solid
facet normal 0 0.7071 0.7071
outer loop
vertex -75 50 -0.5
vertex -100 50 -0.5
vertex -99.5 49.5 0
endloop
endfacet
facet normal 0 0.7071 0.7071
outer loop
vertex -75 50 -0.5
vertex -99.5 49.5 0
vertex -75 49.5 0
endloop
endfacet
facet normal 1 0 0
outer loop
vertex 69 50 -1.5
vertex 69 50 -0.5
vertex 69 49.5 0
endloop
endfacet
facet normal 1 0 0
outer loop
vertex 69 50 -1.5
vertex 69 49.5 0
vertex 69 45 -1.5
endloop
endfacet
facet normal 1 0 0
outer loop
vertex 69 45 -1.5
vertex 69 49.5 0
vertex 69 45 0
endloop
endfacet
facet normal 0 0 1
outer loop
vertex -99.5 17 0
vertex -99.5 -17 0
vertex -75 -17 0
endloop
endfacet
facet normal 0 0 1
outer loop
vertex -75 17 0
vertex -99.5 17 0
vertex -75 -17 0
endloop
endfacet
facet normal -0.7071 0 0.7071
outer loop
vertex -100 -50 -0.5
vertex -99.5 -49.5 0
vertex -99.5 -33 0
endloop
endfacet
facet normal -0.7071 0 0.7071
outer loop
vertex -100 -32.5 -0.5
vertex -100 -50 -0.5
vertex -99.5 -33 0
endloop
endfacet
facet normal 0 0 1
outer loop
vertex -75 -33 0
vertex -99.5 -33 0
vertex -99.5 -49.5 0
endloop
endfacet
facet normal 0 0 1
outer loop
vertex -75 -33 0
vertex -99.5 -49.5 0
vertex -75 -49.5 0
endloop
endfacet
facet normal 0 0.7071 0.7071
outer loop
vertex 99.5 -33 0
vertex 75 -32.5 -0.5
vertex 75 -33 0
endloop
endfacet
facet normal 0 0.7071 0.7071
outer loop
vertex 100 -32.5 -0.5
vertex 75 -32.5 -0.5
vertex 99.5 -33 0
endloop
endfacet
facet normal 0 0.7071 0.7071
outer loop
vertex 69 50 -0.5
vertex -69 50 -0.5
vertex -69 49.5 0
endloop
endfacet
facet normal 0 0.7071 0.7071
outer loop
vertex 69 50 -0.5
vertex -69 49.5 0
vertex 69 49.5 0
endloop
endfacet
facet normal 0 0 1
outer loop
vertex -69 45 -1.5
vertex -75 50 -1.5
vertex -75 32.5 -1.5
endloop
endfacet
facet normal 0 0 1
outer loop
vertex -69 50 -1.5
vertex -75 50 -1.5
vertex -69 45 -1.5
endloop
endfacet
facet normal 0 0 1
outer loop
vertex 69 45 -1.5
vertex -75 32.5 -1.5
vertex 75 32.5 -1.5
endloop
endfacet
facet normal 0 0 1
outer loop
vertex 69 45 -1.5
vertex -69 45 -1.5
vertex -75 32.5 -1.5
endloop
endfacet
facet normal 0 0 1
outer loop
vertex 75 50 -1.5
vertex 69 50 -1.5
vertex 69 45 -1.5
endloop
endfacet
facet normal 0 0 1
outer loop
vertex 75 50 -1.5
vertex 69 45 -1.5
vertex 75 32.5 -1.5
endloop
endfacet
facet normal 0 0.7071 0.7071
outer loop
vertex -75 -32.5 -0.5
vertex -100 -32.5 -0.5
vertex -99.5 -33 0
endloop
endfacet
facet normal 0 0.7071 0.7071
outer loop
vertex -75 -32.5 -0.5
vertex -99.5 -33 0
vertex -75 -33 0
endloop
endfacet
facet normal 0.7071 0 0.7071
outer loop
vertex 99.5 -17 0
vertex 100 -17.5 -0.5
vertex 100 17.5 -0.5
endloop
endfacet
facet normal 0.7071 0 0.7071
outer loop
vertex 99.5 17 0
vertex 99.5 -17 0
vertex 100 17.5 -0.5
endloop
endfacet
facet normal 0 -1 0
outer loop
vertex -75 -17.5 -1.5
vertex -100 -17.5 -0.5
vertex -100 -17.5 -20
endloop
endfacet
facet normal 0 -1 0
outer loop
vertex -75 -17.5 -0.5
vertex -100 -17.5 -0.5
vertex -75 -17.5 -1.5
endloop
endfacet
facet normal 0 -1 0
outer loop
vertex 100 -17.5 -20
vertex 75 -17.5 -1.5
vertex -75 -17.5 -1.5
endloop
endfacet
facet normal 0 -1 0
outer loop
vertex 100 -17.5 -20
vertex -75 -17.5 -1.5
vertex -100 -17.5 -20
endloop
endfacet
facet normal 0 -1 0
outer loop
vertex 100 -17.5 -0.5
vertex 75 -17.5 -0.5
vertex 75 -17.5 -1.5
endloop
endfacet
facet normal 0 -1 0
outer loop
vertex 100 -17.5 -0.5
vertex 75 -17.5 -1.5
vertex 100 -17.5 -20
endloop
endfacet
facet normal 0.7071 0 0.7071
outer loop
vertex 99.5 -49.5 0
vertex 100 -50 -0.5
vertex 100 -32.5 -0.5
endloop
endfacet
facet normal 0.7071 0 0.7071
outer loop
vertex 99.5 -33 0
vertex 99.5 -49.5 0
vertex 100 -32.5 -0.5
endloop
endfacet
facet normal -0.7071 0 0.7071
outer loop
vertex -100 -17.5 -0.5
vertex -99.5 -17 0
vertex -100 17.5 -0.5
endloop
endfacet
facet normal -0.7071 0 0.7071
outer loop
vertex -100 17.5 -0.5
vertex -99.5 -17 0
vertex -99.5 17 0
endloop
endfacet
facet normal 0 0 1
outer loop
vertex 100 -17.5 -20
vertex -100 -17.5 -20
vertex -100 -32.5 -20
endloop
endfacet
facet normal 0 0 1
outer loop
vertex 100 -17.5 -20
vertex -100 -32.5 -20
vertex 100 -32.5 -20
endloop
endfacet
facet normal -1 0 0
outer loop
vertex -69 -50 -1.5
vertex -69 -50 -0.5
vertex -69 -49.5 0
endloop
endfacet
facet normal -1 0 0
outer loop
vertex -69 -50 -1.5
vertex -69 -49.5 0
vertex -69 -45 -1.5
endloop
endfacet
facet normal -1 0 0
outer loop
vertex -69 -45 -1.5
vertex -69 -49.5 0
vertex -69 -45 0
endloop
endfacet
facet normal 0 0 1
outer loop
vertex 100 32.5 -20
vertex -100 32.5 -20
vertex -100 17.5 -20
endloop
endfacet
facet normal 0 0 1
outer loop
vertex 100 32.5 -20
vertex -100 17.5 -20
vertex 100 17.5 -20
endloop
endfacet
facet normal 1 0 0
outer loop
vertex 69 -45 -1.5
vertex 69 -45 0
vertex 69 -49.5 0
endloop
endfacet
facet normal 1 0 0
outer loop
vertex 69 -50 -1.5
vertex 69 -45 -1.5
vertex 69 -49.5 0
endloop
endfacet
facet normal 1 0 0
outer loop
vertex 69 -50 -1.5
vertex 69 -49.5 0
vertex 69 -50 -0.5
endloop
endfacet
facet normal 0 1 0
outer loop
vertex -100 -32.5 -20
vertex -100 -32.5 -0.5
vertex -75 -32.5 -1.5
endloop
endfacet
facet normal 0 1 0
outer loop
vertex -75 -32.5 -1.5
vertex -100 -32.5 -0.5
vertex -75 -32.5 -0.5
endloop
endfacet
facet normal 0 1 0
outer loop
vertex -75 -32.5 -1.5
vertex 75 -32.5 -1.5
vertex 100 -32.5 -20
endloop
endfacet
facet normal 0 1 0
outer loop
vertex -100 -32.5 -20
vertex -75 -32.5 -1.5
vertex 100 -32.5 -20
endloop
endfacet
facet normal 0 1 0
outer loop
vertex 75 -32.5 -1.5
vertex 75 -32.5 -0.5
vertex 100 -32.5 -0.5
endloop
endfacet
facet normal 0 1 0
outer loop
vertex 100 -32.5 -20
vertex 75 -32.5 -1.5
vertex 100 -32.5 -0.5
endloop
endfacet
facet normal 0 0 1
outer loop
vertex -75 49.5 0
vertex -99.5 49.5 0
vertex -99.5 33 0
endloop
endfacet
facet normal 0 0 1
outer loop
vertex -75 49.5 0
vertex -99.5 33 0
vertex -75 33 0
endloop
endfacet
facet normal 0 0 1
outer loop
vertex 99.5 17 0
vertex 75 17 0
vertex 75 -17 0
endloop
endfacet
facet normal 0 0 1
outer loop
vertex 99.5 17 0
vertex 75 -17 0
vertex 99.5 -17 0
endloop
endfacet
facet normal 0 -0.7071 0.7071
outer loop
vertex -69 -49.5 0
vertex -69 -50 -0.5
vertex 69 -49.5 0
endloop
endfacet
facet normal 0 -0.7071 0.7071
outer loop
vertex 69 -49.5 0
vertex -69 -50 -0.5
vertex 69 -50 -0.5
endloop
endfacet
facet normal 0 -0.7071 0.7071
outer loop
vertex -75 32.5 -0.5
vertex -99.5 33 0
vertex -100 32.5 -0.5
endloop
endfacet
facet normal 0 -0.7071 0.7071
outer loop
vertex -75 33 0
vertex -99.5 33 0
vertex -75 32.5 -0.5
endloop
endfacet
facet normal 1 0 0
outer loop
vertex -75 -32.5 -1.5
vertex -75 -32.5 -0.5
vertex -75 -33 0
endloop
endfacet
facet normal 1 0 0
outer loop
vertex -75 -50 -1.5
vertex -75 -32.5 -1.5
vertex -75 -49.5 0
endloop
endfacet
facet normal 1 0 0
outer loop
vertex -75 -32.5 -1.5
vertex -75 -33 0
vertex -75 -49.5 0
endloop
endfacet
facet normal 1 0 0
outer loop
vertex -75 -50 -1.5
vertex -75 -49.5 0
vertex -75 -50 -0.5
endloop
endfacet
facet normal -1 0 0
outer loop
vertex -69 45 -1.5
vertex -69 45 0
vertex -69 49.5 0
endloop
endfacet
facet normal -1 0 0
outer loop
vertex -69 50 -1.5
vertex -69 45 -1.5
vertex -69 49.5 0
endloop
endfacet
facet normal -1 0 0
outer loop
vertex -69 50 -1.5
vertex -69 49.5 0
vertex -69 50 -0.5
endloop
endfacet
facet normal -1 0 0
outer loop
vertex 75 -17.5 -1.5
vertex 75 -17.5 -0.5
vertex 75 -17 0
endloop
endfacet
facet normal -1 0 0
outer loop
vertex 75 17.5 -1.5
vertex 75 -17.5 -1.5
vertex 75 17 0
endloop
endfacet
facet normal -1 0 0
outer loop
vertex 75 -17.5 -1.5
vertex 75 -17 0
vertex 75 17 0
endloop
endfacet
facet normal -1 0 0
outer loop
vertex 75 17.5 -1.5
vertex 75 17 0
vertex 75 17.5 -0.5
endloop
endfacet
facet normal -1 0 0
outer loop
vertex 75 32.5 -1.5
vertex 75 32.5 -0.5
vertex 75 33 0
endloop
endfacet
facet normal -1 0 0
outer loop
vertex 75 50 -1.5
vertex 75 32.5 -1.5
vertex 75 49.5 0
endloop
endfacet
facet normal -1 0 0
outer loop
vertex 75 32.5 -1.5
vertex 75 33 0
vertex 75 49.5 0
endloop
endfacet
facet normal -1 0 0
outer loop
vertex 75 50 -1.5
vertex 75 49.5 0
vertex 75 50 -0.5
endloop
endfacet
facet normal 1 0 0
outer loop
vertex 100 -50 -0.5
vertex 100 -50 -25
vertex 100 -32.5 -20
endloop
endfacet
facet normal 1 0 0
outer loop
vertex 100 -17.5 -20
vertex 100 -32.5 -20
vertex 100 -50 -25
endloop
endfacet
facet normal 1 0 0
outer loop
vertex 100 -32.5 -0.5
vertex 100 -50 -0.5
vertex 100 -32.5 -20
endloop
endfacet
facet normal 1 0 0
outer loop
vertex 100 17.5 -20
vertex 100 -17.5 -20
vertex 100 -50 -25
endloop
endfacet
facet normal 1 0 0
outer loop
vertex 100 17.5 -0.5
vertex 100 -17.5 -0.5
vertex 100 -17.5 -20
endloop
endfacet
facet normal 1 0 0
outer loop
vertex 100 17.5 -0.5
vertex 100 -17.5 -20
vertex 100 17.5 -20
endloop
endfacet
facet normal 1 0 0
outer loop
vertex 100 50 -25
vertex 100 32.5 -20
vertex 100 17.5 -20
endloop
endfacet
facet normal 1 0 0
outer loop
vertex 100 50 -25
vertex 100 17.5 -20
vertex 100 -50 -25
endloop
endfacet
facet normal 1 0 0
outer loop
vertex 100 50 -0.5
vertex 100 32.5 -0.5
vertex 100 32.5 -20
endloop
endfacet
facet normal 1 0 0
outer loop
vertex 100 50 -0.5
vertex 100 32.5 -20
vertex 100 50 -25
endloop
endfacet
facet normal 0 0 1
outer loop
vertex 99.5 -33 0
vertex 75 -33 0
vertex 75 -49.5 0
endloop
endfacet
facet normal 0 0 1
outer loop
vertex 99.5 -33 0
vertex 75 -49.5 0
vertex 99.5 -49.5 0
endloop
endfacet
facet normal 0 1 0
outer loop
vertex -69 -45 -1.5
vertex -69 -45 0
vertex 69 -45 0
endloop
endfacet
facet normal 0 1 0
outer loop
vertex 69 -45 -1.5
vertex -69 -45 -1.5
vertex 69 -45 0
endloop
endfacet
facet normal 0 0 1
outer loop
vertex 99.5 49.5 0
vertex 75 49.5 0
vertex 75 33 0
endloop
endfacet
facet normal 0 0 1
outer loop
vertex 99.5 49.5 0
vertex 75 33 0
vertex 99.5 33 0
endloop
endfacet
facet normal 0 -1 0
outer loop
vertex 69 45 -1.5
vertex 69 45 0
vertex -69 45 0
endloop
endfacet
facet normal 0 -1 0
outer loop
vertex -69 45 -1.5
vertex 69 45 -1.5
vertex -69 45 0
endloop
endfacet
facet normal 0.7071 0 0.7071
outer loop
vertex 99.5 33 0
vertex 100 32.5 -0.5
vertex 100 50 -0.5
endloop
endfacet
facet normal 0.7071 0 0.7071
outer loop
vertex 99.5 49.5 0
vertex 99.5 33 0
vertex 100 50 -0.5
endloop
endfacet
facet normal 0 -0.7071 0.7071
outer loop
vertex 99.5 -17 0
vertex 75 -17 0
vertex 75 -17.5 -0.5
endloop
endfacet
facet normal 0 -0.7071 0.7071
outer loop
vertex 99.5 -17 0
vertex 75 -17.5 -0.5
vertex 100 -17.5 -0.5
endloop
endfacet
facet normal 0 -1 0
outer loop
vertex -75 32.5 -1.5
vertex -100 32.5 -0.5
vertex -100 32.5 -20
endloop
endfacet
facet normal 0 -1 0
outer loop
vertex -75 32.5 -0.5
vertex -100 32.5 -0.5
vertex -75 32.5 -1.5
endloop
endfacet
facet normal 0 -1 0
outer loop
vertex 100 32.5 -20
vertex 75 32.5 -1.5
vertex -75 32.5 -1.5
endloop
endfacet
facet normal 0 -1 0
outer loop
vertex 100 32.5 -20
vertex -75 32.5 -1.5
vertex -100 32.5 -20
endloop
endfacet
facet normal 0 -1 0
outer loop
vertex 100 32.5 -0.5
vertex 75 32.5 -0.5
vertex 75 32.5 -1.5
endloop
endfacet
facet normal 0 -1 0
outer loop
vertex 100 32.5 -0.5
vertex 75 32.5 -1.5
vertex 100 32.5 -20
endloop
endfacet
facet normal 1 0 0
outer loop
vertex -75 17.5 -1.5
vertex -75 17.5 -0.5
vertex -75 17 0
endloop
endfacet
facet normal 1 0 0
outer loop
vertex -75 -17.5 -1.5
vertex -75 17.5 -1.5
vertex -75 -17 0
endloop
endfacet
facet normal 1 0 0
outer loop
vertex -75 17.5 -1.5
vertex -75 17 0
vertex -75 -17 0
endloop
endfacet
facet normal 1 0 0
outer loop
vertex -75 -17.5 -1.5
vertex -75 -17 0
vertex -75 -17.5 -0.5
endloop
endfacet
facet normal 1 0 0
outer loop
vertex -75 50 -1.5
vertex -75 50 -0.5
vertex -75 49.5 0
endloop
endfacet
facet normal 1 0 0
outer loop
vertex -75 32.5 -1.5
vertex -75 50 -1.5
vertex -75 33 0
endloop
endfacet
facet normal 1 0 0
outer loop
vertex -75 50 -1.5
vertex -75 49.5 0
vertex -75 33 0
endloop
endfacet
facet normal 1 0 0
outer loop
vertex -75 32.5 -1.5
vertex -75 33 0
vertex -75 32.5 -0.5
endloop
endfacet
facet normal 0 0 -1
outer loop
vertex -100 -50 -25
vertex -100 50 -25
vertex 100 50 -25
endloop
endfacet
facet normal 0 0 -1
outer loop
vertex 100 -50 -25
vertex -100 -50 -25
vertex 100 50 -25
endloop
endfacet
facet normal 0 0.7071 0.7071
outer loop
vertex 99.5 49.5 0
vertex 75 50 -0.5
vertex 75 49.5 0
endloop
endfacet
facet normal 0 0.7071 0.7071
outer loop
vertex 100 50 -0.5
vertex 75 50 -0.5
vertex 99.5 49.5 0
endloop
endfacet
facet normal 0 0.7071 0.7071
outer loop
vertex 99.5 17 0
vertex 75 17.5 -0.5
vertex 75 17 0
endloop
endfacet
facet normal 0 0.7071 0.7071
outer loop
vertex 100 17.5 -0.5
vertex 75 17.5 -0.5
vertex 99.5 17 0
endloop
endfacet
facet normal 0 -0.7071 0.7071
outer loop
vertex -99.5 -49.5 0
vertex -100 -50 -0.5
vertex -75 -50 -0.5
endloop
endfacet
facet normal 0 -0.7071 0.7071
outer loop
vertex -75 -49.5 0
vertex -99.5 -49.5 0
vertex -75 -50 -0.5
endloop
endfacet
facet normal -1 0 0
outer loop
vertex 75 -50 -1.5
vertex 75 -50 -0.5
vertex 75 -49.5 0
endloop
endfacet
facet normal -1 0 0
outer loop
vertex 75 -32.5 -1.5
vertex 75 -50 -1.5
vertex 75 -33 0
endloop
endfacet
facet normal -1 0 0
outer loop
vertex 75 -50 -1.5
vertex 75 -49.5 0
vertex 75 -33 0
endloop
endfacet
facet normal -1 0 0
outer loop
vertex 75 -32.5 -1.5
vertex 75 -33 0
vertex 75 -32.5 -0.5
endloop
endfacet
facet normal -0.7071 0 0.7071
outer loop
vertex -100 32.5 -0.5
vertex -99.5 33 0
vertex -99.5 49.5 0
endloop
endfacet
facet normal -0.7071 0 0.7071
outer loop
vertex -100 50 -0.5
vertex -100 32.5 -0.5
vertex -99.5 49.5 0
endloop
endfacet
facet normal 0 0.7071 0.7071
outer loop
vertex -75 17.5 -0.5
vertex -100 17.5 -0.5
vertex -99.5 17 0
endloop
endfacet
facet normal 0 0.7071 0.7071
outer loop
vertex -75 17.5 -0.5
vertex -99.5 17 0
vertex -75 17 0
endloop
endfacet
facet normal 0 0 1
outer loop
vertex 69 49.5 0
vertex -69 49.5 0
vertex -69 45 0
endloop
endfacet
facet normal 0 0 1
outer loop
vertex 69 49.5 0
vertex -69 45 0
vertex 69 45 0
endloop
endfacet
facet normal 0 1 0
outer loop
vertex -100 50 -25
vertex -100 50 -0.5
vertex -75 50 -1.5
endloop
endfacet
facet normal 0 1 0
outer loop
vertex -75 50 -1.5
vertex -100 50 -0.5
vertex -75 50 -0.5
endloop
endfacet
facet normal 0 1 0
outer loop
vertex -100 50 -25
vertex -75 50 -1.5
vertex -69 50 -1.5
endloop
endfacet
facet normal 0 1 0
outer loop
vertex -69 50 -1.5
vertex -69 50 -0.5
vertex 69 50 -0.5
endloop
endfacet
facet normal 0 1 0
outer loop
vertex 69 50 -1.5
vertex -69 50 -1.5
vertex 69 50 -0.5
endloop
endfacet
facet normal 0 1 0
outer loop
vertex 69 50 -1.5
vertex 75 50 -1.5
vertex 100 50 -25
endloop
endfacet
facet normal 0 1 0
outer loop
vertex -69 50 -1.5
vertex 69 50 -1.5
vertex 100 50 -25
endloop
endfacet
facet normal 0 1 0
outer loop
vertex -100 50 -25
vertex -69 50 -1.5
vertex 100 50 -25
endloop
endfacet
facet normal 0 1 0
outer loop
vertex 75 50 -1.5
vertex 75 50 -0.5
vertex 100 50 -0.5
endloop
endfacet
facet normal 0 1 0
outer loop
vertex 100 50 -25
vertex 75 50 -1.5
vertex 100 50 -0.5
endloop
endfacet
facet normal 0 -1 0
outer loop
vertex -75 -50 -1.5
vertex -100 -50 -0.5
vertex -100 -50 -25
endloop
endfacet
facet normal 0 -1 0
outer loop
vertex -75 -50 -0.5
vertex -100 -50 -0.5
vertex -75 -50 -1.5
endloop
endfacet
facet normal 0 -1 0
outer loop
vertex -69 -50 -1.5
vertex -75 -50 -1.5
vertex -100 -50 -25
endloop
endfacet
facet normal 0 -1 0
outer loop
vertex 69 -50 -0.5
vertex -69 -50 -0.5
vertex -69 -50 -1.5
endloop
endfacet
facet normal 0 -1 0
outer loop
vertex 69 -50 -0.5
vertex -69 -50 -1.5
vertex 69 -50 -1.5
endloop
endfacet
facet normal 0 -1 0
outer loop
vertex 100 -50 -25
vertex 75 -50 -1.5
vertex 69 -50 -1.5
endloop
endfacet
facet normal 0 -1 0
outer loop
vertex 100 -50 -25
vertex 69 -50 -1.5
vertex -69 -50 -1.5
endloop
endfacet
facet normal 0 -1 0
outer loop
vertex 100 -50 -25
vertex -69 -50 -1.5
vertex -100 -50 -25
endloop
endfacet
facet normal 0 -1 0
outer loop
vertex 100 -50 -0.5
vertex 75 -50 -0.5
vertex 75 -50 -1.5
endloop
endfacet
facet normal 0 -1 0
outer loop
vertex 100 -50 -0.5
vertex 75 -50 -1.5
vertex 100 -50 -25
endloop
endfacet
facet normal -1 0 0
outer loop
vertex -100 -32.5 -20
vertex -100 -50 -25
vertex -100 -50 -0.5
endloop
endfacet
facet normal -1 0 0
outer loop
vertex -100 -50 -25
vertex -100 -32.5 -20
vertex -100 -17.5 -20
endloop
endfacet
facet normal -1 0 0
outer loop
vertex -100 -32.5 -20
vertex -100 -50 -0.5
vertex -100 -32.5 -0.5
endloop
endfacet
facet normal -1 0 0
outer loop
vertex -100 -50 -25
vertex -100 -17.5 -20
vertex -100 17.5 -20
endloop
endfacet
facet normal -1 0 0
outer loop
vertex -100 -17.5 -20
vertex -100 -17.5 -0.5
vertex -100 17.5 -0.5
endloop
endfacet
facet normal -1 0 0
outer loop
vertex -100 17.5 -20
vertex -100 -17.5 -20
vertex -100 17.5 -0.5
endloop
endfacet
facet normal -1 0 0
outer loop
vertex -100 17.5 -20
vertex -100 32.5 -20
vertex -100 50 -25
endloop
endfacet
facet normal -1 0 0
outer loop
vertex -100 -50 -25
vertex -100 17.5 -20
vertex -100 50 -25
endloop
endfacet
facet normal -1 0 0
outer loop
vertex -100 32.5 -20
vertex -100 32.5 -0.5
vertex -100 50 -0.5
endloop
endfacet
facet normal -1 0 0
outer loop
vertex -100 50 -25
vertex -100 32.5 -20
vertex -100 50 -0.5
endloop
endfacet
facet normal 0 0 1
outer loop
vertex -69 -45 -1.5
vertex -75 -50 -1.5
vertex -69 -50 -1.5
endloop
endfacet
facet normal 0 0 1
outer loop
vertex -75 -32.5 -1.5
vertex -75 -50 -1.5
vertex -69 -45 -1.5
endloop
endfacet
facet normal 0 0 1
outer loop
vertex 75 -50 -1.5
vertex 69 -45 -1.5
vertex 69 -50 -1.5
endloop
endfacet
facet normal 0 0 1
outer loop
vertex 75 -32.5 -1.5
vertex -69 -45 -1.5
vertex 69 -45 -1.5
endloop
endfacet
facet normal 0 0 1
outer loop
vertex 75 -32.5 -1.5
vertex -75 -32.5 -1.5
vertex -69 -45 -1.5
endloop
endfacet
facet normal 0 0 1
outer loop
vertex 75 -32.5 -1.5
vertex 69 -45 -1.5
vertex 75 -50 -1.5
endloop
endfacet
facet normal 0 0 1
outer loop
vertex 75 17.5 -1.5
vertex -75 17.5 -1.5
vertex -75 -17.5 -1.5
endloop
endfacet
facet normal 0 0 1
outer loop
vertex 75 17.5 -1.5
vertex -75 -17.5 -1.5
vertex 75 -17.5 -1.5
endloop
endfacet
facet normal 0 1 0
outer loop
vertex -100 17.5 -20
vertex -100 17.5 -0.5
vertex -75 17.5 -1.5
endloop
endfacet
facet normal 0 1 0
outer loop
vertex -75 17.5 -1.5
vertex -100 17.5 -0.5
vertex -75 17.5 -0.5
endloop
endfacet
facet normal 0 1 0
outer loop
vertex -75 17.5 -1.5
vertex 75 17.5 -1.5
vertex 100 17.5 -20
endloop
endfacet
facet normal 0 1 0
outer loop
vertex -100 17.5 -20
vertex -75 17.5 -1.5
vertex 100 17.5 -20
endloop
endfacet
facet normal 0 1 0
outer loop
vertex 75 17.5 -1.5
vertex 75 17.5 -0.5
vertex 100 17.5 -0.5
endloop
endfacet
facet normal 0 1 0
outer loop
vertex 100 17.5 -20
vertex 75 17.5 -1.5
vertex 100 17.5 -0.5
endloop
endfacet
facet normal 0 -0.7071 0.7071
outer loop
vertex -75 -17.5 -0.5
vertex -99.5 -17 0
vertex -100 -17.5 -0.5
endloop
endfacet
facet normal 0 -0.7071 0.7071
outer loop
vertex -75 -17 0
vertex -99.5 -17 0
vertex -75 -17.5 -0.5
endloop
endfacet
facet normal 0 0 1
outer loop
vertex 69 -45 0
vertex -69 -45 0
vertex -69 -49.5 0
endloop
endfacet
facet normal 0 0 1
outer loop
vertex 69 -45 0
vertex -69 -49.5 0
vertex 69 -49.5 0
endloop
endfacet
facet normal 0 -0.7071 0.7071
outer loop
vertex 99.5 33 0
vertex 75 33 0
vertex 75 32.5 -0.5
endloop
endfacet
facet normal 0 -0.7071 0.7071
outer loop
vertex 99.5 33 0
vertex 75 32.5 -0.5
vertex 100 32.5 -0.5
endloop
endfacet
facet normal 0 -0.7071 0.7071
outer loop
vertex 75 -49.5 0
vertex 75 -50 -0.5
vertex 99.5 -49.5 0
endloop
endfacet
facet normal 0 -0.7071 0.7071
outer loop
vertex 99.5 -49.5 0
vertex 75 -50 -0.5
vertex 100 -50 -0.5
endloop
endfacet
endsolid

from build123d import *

# Parameters (mm, degrees)
F0_W     = 200
F0_H     = 100
F1_DEPTH = 25
F2_W     = 200
F2_H     = 15
F3_DEPTH = 20
F4_SIZE  = 0.5
F6_DEPTH = 1.5


with BuildPart() as f1:
    # F0 (on Top) → F1 (new body)
    with BuildSketch(Plane.XY):
        Rectangle(F0_W, F0_H)
    extrude(amount=-F1_DEPTH)

    # F2 (on face) → F3 (cut)
    with BuildSketch(Plane.XY):
        with Locations((0, 25.0000003725)):
            Rectangle(F2_W, F2_H)
        with Locations((0, -25.0000003725)):
            Rectangle(F2_W, F2_H)
    extrude(amount=-F3_DEPTH, mode=Mode.SUBTRACT)

    # F4
    f4_edges = [f1.edges().sort_by_distance(p)[0] for p in [
        (0, -50, 0),
        (0, -32.5, 0),
        (0, -17.5, 0),
        (0, 17.5, 0),
        (0, 32.5, 0),
        (0, 50, 0),
        (100, -41.25, 0),
        (100, 0, 0),
        (100, 41.25, 0),
        (-100, 41.25, 0),
        (-100, 0, 0),
        (-100, -41.25, 0),
    ]]
    chamfer(f4_edges, length=F4_SIZE)

    # F5 (on Top) → F6 (cut)
    with BuildSketch(Plane.XY):
        with BuildLine():
            Line((69, 55), (69, 45))
            Line((69, 45), (-69, 45))
            Line((-69, 45), (-69, 55))
            ThreePointArc((-69, 55), (-72, 58), (-75, 55))
            Line((-75, 55), (-75, -55))
            ThreePointArc((-75, -55), (-72, -52), (-69, -55))
            Line((-69, -55), (-69, -45))
            Line((-69, -45), (69, -45))
            Line((69, -45), (69, -55))
            ThreePointArc((69, -55), (72, -58), (75, -55))
            Line((75, -55), (75, 0))
            Line((75, 0), (75, 55))
            ThreePointArc((75, 55), (72, 58), (69, 55))
        make_face()
    extrude(amount=-F6_DEPTH, mode=Mode.SUBTRACT)


solid = f1.part
